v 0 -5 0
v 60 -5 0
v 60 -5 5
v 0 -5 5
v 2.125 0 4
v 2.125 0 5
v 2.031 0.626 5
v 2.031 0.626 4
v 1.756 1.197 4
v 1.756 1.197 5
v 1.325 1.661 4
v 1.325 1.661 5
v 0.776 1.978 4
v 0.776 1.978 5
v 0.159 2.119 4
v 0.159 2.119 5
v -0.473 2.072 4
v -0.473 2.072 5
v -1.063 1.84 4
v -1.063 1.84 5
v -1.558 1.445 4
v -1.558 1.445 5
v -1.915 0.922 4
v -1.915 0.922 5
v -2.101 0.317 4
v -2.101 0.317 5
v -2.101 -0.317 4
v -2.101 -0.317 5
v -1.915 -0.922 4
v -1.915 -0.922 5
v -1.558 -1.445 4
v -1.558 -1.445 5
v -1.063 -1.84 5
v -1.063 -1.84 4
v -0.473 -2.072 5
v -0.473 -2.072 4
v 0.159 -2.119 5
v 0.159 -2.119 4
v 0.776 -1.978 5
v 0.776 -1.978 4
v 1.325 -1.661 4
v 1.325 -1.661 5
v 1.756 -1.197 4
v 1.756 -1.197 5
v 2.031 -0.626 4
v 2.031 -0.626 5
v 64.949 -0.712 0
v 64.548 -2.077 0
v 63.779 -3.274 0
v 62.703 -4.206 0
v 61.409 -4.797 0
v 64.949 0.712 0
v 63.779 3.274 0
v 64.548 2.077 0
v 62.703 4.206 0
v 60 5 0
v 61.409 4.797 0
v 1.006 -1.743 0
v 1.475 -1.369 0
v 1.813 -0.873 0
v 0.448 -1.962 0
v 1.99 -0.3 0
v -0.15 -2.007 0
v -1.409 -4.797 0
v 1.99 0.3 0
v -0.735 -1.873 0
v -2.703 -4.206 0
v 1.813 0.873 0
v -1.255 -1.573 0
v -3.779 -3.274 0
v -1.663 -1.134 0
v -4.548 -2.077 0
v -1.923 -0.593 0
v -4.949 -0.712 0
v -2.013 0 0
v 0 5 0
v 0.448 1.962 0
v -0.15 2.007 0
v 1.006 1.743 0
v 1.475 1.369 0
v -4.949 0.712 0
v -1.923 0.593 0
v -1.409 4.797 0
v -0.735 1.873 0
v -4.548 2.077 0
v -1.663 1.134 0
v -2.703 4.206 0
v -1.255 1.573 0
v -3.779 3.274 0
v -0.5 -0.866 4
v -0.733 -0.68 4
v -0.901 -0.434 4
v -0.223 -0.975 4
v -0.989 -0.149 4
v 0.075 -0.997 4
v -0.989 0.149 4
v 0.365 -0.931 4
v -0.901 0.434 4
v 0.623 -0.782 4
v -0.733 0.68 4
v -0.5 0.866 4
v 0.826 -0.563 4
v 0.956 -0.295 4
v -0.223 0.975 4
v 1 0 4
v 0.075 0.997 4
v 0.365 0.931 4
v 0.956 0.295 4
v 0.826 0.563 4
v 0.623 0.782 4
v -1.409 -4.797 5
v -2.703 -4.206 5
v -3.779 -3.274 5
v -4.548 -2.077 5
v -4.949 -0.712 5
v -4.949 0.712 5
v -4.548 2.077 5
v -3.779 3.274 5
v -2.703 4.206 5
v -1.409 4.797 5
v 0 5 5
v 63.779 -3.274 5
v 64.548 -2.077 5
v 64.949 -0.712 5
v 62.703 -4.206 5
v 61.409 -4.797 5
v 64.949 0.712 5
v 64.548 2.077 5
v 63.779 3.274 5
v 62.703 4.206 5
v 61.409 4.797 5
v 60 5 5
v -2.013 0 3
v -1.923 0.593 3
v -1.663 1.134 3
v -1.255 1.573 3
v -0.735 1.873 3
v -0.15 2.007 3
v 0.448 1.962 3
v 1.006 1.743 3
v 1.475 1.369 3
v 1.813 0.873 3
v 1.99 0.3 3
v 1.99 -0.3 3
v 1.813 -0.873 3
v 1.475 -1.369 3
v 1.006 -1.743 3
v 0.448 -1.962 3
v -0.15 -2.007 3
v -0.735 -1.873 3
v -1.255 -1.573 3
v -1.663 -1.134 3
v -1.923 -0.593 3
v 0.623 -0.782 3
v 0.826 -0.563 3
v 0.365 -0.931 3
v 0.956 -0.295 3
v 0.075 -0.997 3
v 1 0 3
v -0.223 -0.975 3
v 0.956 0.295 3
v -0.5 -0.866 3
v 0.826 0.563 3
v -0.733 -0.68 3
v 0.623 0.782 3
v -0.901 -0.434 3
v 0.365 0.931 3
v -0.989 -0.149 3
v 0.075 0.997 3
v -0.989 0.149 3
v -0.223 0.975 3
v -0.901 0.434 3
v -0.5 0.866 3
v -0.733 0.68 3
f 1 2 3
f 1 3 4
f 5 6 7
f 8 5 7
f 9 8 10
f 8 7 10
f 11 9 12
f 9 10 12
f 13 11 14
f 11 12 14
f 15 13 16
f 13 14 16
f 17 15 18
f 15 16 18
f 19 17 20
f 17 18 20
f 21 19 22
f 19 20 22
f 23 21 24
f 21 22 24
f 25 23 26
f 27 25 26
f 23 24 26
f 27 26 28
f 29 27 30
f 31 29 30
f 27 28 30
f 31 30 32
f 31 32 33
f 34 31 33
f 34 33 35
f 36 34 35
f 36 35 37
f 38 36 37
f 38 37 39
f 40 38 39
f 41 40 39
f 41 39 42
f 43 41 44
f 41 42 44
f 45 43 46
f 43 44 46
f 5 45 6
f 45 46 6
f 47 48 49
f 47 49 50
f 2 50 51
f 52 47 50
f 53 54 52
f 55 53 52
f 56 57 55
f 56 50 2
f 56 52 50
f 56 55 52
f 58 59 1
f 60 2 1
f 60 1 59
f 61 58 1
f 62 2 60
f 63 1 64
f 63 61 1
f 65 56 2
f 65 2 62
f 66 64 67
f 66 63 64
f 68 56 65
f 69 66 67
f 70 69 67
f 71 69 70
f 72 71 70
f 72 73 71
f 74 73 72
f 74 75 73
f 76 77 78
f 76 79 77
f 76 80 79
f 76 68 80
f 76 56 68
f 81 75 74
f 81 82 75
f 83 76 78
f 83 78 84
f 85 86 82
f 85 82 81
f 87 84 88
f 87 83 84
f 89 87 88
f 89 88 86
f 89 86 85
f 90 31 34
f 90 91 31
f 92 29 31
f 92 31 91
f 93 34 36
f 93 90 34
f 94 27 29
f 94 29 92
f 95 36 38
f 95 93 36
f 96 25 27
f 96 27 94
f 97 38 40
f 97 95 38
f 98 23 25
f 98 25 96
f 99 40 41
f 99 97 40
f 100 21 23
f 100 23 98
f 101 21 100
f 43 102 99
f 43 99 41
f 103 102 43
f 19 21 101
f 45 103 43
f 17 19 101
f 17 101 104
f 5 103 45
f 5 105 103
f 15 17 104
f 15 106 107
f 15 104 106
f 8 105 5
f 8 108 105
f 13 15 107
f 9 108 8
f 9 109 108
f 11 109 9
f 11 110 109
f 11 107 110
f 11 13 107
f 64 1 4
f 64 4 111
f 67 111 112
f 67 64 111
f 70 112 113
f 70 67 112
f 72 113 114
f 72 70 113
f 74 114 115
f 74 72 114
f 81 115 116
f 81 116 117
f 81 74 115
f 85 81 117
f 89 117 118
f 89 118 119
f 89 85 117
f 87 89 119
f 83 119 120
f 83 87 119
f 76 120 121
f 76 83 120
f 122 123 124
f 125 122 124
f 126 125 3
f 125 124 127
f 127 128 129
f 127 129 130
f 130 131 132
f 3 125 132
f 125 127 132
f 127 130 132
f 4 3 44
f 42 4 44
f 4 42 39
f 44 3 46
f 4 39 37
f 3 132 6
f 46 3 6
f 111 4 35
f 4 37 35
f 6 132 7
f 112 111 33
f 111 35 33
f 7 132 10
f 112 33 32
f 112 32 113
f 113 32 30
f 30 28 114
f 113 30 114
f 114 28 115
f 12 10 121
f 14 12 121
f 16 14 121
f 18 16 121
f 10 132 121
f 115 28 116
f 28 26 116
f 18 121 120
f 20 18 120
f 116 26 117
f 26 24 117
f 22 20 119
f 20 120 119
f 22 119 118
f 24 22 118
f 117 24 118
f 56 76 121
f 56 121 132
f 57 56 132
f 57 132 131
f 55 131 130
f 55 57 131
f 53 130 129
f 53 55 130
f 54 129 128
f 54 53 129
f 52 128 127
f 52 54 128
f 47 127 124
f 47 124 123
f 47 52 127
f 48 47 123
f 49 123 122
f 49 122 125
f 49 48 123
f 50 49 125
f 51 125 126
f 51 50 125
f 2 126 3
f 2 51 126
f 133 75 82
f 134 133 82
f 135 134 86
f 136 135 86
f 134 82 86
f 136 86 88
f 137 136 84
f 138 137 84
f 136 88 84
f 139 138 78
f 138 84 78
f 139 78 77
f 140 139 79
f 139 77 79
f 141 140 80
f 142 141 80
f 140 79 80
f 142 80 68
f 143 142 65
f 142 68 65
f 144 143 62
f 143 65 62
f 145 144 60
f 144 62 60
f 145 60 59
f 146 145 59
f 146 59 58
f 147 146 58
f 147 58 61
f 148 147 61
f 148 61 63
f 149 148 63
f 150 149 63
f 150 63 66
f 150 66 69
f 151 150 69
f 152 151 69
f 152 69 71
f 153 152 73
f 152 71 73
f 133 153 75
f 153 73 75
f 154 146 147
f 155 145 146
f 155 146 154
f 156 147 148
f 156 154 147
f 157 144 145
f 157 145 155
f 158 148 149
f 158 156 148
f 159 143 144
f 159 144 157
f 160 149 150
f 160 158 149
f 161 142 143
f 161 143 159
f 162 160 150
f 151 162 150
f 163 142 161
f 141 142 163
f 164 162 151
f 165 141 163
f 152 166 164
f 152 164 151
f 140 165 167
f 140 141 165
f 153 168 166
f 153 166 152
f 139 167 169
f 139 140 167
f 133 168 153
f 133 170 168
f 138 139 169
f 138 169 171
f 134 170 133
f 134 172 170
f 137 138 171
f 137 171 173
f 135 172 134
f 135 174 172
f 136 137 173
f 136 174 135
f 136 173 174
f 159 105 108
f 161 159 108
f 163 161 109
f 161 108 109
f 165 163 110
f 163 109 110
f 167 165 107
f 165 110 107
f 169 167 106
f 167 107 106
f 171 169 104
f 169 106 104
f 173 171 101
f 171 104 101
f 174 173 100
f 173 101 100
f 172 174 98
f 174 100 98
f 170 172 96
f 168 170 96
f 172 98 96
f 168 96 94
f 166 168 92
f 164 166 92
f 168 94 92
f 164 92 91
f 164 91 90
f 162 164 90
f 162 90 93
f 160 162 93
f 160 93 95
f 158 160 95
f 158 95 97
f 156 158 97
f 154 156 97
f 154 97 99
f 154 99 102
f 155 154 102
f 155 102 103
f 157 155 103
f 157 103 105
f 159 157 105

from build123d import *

# Parameters (mm, degrees)
BOSS_EXTRUDE1_DEPTH = 5
SKETCH2_R           = 2.0125
CUT_EXTRUDE1_DEPTH  = 3
SKETCH3_R           = 2.125
CUT_EXTRUDE2_DEPTH  = 1
SKETCH4_R           = 1
CUT_EXTRUDE3_DEPTH  = 5


with BuildPart() as part:
    # Sketch1 → Boss-Extrude1 (new body)
    with BuildSketch(Plane.XY):
        with BuildLine():
            Line((0, 5), (60, 5))
            ThreePointArc((60, 5), (65, 0), (60, -5))
            Line((60, -5), (0, -5))
            ThreePointArc((0, -5), (-5, 0), (0, 5))
        make_face()
    extrude(amount=BOSS_EXTRUDE1_DEPTH)

    # Sketch2 → Cut-Extrude1 (cut)
    with BuildSketch(Plane(origin=(0, 0, 0), x_dir=(-1, 0, 0), z_dir=(0, 0, -1))):
        Circle(SKETCH2_R)
    extrude(amount=-CUT_EXTRUDE1_DEPTH, mode=Mode.SUBTRACT)

    # Sketch3 → Cut-Extrude2 (cut)
    with BuildSketch(Plane.XY.offset(5)):
        Circle(SKETCH3_R)
    extrude(amount=-CUT_EXTRUDE2_DEPTH, mode=Mode.SUBTRACT)

    # Sketch4 → Cut-Extrude3 (cut, through all)
    with BuildSketch(Plane.XY.offset(4)):
        Circle(SKETCH4_R)
    extrude(amount=-CUT_EXTRUDE3_DEPTH, mode=Mode.SUBTRACT)


solid = part.part
